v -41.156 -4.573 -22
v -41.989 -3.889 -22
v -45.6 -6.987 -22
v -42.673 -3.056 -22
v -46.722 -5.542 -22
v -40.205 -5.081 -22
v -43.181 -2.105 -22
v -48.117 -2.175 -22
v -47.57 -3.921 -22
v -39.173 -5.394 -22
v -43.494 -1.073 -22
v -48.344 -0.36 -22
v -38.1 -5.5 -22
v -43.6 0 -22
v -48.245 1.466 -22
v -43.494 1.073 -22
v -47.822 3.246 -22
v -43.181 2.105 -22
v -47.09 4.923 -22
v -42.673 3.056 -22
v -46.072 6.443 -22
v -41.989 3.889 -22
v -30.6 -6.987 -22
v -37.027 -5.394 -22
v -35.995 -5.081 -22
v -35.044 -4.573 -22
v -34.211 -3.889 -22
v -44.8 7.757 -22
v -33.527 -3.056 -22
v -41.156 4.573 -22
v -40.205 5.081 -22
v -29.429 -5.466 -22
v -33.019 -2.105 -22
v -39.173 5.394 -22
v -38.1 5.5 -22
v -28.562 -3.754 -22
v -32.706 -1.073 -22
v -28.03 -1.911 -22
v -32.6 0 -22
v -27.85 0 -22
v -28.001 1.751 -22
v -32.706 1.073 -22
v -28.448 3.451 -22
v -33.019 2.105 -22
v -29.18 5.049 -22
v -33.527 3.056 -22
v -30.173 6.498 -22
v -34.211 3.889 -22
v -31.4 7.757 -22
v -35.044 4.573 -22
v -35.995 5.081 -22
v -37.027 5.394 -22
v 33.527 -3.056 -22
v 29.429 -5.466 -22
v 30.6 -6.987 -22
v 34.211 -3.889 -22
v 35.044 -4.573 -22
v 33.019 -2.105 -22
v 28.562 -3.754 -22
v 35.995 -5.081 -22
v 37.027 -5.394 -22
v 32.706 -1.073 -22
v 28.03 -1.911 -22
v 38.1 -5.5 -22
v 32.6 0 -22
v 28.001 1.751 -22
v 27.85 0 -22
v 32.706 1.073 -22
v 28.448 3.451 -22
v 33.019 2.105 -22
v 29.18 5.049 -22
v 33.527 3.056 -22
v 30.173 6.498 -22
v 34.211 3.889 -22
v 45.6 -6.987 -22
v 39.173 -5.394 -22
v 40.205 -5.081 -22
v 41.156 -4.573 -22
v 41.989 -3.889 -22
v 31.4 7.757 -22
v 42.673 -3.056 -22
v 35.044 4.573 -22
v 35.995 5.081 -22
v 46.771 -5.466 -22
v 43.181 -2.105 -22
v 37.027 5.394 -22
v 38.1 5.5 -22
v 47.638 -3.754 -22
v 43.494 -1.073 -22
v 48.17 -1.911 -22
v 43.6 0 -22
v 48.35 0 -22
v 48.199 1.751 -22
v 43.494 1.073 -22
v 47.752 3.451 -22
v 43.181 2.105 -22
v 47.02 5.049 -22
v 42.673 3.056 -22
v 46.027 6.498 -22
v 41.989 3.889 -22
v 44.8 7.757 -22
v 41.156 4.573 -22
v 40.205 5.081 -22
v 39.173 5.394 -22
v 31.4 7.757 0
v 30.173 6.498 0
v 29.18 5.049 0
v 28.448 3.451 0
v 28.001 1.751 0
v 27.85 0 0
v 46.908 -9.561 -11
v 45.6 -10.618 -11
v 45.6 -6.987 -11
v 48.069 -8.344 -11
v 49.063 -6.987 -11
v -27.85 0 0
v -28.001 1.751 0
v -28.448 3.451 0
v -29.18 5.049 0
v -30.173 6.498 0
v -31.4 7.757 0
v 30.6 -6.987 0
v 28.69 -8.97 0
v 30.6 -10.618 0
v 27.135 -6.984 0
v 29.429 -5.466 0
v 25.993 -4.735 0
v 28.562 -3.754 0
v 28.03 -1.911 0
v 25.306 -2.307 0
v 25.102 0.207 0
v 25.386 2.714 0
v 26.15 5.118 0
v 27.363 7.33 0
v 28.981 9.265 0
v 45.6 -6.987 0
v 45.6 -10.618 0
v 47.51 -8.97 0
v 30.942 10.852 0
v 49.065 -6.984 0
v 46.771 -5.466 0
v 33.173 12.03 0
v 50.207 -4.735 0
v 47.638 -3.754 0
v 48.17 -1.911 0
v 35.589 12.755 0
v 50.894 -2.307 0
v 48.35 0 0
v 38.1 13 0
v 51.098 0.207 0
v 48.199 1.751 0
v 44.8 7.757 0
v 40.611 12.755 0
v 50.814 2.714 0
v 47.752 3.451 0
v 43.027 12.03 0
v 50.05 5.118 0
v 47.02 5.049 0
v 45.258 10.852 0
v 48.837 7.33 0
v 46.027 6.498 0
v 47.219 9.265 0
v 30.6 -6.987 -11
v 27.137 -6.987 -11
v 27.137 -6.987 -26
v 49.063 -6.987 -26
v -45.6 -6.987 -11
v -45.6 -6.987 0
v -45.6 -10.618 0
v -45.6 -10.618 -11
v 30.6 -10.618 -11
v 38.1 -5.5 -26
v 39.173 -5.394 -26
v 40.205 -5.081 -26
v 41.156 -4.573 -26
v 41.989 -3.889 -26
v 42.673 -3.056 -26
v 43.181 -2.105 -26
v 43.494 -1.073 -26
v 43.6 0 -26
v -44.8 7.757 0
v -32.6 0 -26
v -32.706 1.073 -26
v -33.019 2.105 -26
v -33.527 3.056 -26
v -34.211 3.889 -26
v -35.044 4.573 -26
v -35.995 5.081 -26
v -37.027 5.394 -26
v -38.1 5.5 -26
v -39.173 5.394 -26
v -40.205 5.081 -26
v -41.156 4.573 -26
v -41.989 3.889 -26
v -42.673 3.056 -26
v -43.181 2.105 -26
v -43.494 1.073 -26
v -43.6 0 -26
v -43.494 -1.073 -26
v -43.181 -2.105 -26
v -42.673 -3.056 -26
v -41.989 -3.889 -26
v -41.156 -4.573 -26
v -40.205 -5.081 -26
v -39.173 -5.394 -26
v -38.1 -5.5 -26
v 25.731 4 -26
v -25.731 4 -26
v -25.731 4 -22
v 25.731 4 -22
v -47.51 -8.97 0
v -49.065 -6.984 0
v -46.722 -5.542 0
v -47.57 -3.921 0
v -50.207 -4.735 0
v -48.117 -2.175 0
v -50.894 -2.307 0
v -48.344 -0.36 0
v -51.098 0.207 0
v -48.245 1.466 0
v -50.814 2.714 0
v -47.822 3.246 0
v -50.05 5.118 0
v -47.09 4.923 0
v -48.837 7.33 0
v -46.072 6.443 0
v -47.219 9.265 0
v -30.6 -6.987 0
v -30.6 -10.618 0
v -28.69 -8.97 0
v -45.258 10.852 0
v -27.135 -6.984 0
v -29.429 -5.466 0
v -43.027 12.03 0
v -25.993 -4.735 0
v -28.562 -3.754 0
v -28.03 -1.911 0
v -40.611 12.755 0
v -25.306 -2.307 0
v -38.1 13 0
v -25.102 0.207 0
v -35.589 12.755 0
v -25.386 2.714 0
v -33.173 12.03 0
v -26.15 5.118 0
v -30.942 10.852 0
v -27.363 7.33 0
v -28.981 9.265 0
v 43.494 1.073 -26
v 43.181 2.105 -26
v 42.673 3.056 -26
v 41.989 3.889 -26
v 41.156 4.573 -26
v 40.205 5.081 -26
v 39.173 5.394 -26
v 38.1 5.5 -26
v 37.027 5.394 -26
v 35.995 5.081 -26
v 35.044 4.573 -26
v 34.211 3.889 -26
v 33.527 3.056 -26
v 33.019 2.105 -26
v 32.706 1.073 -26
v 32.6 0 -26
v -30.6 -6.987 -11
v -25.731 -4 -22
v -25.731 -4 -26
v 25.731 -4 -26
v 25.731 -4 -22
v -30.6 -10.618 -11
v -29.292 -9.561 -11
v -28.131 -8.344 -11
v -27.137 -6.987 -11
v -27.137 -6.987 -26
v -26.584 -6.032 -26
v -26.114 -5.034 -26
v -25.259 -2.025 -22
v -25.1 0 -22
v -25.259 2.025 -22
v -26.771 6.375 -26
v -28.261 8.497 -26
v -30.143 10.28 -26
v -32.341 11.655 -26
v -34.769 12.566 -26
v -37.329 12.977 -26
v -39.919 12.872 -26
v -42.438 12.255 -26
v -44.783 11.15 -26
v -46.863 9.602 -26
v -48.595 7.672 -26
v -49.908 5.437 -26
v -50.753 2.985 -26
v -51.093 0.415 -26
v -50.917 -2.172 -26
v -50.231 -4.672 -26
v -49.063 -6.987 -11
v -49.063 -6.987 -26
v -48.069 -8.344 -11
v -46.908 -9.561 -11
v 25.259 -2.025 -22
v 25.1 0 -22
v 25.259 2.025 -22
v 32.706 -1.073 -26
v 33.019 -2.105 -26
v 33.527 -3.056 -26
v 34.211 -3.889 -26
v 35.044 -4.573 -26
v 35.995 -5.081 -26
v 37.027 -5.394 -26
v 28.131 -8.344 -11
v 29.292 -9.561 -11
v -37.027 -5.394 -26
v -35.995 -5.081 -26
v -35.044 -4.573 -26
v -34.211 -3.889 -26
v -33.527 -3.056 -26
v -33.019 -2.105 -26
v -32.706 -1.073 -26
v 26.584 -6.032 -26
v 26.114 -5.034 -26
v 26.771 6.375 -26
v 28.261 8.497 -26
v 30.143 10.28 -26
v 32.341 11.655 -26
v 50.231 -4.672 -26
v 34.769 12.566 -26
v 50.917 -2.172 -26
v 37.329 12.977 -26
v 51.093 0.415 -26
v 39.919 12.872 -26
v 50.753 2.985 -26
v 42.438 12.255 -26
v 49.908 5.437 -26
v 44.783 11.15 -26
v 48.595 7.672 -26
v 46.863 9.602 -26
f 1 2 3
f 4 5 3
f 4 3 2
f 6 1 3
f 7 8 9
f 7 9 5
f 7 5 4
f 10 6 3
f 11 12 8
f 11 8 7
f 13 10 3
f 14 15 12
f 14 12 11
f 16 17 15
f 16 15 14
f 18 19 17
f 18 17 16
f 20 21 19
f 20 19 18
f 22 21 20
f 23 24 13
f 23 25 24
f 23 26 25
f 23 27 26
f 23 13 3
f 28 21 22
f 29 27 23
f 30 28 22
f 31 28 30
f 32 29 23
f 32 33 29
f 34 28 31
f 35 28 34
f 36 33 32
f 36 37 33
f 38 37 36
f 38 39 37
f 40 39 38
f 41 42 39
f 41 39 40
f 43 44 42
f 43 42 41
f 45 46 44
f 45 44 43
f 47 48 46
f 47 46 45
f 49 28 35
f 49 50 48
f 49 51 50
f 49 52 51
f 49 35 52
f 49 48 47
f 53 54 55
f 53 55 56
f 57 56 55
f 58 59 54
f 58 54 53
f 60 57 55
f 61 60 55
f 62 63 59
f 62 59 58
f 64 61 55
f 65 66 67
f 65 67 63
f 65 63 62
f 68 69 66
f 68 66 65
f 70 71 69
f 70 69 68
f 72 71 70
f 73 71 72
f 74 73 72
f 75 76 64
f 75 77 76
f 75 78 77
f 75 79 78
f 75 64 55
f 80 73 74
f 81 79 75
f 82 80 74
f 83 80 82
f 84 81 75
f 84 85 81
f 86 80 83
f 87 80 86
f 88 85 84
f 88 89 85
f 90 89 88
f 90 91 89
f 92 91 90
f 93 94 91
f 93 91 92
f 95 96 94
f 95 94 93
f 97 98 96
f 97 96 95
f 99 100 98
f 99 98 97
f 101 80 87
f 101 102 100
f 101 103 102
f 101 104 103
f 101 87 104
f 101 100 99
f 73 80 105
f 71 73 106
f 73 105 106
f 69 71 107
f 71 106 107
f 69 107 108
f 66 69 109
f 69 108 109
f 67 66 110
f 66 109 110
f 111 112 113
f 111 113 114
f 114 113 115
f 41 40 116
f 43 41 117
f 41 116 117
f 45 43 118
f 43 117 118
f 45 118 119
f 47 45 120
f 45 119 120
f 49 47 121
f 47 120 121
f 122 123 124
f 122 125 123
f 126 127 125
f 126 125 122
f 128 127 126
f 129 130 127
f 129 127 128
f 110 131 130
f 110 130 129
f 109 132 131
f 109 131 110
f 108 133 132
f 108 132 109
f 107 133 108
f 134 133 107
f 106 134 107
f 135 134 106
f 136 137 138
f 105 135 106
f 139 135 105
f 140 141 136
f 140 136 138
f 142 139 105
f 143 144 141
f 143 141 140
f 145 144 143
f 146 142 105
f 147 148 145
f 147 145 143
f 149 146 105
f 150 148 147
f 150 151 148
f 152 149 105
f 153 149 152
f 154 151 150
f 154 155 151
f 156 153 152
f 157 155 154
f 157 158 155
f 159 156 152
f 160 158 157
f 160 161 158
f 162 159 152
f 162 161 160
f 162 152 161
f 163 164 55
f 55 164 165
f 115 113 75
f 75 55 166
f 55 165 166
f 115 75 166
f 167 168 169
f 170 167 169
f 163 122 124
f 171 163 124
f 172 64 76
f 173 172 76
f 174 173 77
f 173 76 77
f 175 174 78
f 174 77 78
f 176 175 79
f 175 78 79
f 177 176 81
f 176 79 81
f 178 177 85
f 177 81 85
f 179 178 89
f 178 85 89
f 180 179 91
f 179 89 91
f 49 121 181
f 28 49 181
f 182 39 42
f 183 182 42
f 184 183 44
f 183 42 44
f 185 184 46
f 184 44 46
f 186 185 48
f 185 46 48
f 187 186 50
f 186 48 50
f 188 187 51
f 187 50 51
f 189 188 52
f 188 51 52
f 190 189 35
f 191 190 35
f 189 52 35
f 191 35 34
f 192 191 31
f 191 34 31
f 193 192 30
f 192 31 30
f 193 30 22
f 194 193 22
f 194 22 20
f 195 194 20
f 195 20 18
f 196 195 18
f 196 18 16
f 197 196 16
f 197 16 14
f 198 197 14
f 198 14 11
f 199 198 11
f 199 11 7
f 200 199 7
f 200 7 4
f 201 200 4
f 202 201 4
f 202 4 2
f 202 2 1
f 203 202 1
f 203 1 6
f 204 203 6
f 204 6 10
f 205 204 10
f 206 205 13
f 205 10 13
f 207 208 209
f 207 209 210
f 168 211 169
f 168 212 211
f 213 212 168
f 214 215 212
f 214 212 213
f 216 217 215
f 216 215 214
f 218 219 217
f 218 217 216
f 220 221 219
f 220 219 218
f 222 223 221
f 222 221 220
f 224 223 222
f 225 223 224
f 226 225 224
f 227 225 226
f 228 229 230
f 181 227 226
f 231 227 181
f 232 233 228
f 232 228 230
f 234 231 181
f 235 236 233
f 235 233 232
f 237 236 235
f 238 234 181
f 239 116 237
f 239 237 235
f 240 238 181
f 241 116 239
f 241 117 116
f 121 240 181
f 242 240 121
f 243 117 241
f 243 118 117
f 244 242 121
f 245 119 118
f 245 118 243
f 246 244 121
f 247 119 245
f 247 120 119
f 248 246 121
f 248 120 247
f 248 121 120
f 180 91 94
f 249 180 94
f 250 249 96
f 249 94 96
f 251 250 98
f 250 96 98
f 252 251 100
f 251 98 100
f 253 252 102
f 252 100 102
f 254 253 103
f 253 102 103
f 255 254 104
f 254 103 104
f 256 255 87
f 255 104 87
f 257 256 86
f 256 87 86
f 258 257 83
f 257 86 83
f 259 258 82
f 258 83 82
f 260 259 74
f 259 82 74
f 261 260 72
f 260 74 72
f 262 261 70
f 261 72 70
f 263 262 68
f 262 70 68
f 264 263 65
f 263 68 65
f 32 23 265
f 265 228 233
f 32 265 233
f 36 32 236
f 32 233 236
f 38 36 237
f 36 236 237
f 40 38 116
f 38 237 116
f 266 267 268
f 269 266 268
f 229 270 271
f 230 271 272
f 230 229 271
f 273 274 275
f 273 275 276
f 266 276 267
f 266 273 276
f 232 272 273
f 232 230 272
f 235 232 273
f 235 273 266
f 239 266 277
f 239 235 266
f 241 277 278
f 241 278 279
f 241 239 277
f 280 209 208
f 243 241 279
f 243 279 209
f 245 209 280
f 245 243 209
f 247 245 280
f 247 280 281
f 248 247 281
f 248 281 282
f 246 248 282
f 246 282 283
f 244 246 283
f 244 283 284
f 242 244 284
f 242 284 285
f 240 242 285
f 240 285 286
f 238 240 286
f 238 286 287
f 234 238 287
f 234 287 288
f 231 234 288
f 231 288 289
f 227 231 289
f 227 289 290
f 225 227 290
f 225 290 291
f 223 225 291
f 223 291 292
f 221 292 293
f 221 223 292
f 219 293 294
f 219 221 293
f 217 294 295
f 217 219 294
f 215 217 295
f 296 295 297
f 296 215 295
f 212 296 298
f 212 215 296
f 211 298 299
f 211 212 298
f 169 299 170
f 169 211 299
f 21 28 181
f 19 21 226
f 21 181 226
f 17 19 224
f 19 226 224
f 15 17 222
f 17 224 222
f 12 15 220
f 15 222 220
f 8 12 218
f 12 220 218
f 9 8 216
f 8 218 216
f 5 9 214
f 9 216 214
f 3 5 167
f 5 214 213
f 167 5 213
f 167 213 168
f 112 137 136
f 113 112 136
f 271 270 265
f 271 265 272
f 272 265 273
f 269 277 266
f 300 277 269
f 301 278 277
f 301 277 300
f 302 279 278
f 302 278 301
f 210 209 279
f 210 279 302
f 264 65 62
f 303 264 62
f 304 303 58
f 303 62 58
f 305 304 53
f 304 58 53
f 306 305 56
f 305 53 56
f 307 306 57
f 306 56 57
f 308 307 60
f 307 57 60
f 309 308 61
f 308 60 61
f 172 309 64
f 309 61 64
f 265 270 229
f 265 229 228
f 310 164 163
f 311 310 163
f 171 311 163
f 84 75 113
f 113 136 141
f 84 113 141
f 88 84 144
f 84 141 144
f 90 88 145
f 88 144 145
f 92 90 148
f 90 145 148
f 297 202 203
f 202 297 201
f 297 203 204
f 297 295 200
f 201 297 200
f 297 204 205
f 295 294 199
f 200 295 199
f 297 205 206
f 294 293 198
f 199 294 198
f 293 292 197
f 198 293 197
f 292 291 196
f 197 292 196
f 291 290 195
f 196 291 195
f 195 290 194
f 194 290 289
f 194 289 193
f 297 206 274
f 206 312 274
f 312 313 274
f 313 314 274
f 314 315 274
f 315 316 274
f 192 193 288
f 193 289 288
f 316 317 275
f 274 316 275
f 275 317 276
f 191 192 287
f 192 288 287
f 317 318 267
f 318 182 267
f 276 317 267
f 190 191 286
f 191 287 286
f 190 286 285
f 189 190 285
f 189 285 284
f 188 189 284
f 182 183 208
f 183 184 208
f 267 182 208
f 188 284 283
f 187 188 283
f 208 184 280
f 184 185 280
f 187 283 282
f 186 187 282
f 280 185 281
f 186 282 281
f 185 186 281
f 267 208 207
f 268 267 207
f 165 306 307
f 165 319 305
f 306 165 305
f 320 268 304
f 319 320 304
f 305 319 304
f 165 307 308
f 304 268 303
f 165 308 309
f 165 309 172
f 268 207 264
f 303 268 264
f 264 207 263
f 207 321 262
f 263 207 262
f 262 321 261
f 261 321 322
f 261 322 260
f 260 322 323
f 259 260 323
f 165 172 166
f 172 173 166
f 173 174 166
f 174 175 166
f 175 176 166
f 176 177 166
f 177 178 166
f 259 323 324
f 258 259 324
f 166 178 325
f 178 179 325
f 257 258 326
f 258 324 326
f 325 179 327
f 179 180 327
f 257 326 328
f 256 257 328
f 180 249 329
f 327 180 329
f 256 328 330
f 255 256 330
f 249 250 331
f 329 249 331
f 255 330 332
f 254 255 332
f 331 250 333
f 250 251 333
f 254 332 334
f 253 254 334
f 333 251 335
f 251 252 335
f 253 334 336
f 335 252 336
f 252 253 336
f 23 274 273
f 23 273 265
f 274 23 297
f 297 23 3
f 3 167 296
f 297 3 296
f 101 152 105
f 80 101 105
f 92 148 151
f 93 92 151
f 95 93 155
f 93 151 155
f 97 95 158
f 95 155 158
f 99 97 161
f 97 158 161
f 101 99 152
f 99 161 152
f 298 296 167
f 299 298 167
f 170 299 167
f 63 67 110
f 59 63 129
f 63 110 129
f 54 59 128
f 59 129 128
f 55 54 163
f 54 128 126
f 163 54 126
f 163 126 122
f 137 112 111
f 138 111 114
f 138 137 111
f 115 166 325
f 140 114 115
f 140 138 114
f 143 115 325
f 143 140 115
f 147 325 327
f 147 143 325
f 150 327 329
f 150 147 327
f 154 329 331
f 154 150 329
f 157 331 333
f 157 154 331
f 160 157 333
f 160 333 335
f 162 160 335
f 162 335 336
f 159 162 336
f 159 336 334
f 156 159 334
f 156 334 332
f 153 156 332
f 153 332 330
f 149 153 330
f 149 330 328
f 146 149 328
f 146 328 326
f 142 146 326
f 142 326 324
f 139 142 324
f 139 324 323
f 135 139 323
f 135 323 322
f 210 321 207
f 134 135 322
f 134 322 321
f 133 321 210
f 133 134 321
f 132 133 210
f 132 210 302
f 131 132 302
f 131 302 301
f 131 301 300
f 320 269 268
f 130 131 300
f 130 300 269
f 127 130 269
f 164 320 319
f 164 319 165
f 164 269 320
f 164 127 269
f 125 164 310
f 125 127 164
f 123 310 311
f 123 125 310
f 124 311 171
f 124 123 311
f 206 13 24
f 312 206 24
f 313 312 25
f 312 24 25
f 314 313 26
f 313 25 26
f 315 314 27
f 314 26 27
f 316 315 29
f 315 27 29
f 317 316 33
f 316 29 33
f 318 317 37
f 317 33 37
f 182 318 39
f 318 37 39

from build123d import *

# Parameters (mm, degrees)
F0_R      = 13
F2_DEPTH  = 26
F3_DEPTH  = 22
F5_DEPTH  = 30
F7_W      = 53
F7_H      = 8
F8_DEPTH  = 4
F9_W      = 25
F9_H      = 5
F10_DEPTH = 15


with BuildPart() as f2:
    # F0 (on Top) → F2 (new body)
    with BuildSketch(Plane.XY):
        with Locations((-38.1, 0)):
            Circle(F0_R)
    extrude(amount=-F2_DEPTH)


with BuildPart() as f2b:
    # F0 (on Top) → F2, piece 2 (new body)
    with BuildSketch(Plane.XY):
        with BuildLine():
            ThreePointArc((51.1, 0), (38.1, 13), (25.1, 0))
            ThreePointArc((25.1, 0), (38.1, -13), (51.1, 0))
        make_face()
    extrude(amount=-F2_DEPTH)


with BuildPart() as f3_tool:
    # F1 (on Top) → F3 (new body)
    with BuildSketch(Plane.XY):
        with BuildLine():
            ThreePointArc((-31.4, -7.7570935279), (-28.779659341, -4.2654132273), (-27.85, 0))
            Line((-27.85, 0), (-31.4, 0))
            Line((-31.4, 0), (-31.4, -7.7570935279))
        make_face()
        with BuildLine():
            Line((-31.4, 0), (-27.85, 0))
            ThreePointArc((-27.85, 0), (-28.779659341, 4.2654132273), (-31.4, 7.7570935279))
            Line((-31.4, 7.7570935279), (-31.4, 0))
        make_face()
        Polygon((-31.4, -7.7570935279), (-31.4, 0), (-31.4, 7.7570935279), (-44.8, 7.7570935279), (-44.8, -7.7570935279), align=None)
        with BuildLine():
            Line((-44.8, -7.7570935279), (-44.8, 7.7570935279))
            ThreePointArc((-44.8, 7.7570935279), (-48.35, 0), (-44.8, -7.7570935279))
        make_face()
        Polygon((31.4, 7.7570935279), (31.4, 0), (31.4, -7.7570935279), (44.8, -7.7570935279), (44.8, 7.7570935279), align=None)
        with BuildLine():
            ThreePointArc((48.35, 0), (47.420340659, 4.2654132273), (44.8, 7.7570935279))
            Line((44.8, 7.7570935279), (44.8, -7.7570935279))
            ThreePointArc((44.8, -7.7570935279), (47.420340659, -4.2654132273), (48.35, 0))
        make_face()
        with BuildLine():
            Line((31.4, -7.7570935279), (31.4, 0))
            Line((31.4, 0), (27.85, 0))
            ThreePointArc((27.85, 0), (28.779659341, -4.2654132273), (31.4, -7.7570935279))
        make_face()
        with BuildLine():
            Line((27.85, 0), (31.4, 0))
            Line((31.4, 0), (31.4, 7.7570935279))
            ThreePointArc((31.4, 7.7570935279), (28.779659341, 4.2654132273), (27.85, 0))
        make_face()
    extrude(amount=-F3_DEPTH)


with BuildPart() as f2_1:
    add(f2.part)

    # F3: cut by f3_tool
    add(f3_tool.part, mode=Mode.SUBTRACT)


with BuildPart() as f2b_1:
    add(f2b.part)

    # F3: cut by f3_tool
    add(f3_tool.part, mode=Mode.SUBTRACT)


with BuildPart() as f5_tool:
    # F4 (on Top) → F5 (new body)
    with BuildSketch(Plane.XY):
        with BuildLine():
            ThreePointArc((-38.1, -5.5), (-34.2109127035, -3.8890872965), (-32.6, 0))
            Line((-32.6, 0), (-38.1, 0))
            Line((-38.1, 0), (-38.1, -5.5))
        make_face()
        Polygon((45.6, -6.9865943062), (38.1, -6.9865943062), (30.6, -6.9865943062), (30.6, -13), (45.6, -13), align=None)
        with BuildLine():
            ThreePointArc((43.6, 0), (38.1, 5.5), (32.6, 0))
            Line((32.6, 0), (38.1, 0))
            Line((38.1, 0), (38.1, -5.5))
            ThreePointArc((38.1, -5.5), (41.9890872965, -3.8890872965), (43.6, 0))
        make_face()
        with BuildLine():
            Line((38.1, 0), (32.6, 0))
            ThreePointArc((32.6, 0), (34.2109127035, -3.8890872965), (38.1, -5.5))
            Line((38.1, -5.5), (38.1, 0))
        make_face()
        with BuildLine():
            Line((-38.1, 0), (-32.6, 0))
            ThreePointArc((-32.6, 0), (-41.9890872965, 3.8890872965), (-38.1, -5.5))
            Line((-38.1, -5.5), (-38.1, 0))
        make_face()
        Polygon((-30.6, -6.9865943062), (-38.1, -6.9865943062), (-45.6, -6.9865943062), (-45.6, -13), (-30.6, -13), align=None)
    extrude(amount=-F5_DEPTH)


with BuildPart() as f2_2:
    add(f2_1.part)

    # F5: cut by f5_tool
    add(f5_tool.part, mode=Mode.SUBTRACT)



with BuildPart() as f2b_2:
    add(f2b_1.part)

    # F5: cut by f5_tool
    add(f5_tool.part, mode=Mode.SUBTRACT)


with BuildPart() as f2_3:
    add(f2_2.part)

    add(f2b_2.part)  # F8 merges F2b
    # F7 (on offset) → F8 (join)
    with BuildSketch(Plane.XY.offset(-26)):
        Rectangle(F7_W, F7_H)
    extrude(amount=F8_DEPTH)

    # F9 (on offset) → F10 (cut)
    with BuildSketch(Plane.XY.offset(-26)):
        with Locations((-38.1, -9.4865943062)):
            Rectangle(F9_W, F9_H)
        with Locations((38.1, -9.4865943062)):
            Rectangle(F9_W, F9_H)
    extrude(amount=F10_DEPTH, mode=Mode.SUBTRACT)


solid = f2_3.part
